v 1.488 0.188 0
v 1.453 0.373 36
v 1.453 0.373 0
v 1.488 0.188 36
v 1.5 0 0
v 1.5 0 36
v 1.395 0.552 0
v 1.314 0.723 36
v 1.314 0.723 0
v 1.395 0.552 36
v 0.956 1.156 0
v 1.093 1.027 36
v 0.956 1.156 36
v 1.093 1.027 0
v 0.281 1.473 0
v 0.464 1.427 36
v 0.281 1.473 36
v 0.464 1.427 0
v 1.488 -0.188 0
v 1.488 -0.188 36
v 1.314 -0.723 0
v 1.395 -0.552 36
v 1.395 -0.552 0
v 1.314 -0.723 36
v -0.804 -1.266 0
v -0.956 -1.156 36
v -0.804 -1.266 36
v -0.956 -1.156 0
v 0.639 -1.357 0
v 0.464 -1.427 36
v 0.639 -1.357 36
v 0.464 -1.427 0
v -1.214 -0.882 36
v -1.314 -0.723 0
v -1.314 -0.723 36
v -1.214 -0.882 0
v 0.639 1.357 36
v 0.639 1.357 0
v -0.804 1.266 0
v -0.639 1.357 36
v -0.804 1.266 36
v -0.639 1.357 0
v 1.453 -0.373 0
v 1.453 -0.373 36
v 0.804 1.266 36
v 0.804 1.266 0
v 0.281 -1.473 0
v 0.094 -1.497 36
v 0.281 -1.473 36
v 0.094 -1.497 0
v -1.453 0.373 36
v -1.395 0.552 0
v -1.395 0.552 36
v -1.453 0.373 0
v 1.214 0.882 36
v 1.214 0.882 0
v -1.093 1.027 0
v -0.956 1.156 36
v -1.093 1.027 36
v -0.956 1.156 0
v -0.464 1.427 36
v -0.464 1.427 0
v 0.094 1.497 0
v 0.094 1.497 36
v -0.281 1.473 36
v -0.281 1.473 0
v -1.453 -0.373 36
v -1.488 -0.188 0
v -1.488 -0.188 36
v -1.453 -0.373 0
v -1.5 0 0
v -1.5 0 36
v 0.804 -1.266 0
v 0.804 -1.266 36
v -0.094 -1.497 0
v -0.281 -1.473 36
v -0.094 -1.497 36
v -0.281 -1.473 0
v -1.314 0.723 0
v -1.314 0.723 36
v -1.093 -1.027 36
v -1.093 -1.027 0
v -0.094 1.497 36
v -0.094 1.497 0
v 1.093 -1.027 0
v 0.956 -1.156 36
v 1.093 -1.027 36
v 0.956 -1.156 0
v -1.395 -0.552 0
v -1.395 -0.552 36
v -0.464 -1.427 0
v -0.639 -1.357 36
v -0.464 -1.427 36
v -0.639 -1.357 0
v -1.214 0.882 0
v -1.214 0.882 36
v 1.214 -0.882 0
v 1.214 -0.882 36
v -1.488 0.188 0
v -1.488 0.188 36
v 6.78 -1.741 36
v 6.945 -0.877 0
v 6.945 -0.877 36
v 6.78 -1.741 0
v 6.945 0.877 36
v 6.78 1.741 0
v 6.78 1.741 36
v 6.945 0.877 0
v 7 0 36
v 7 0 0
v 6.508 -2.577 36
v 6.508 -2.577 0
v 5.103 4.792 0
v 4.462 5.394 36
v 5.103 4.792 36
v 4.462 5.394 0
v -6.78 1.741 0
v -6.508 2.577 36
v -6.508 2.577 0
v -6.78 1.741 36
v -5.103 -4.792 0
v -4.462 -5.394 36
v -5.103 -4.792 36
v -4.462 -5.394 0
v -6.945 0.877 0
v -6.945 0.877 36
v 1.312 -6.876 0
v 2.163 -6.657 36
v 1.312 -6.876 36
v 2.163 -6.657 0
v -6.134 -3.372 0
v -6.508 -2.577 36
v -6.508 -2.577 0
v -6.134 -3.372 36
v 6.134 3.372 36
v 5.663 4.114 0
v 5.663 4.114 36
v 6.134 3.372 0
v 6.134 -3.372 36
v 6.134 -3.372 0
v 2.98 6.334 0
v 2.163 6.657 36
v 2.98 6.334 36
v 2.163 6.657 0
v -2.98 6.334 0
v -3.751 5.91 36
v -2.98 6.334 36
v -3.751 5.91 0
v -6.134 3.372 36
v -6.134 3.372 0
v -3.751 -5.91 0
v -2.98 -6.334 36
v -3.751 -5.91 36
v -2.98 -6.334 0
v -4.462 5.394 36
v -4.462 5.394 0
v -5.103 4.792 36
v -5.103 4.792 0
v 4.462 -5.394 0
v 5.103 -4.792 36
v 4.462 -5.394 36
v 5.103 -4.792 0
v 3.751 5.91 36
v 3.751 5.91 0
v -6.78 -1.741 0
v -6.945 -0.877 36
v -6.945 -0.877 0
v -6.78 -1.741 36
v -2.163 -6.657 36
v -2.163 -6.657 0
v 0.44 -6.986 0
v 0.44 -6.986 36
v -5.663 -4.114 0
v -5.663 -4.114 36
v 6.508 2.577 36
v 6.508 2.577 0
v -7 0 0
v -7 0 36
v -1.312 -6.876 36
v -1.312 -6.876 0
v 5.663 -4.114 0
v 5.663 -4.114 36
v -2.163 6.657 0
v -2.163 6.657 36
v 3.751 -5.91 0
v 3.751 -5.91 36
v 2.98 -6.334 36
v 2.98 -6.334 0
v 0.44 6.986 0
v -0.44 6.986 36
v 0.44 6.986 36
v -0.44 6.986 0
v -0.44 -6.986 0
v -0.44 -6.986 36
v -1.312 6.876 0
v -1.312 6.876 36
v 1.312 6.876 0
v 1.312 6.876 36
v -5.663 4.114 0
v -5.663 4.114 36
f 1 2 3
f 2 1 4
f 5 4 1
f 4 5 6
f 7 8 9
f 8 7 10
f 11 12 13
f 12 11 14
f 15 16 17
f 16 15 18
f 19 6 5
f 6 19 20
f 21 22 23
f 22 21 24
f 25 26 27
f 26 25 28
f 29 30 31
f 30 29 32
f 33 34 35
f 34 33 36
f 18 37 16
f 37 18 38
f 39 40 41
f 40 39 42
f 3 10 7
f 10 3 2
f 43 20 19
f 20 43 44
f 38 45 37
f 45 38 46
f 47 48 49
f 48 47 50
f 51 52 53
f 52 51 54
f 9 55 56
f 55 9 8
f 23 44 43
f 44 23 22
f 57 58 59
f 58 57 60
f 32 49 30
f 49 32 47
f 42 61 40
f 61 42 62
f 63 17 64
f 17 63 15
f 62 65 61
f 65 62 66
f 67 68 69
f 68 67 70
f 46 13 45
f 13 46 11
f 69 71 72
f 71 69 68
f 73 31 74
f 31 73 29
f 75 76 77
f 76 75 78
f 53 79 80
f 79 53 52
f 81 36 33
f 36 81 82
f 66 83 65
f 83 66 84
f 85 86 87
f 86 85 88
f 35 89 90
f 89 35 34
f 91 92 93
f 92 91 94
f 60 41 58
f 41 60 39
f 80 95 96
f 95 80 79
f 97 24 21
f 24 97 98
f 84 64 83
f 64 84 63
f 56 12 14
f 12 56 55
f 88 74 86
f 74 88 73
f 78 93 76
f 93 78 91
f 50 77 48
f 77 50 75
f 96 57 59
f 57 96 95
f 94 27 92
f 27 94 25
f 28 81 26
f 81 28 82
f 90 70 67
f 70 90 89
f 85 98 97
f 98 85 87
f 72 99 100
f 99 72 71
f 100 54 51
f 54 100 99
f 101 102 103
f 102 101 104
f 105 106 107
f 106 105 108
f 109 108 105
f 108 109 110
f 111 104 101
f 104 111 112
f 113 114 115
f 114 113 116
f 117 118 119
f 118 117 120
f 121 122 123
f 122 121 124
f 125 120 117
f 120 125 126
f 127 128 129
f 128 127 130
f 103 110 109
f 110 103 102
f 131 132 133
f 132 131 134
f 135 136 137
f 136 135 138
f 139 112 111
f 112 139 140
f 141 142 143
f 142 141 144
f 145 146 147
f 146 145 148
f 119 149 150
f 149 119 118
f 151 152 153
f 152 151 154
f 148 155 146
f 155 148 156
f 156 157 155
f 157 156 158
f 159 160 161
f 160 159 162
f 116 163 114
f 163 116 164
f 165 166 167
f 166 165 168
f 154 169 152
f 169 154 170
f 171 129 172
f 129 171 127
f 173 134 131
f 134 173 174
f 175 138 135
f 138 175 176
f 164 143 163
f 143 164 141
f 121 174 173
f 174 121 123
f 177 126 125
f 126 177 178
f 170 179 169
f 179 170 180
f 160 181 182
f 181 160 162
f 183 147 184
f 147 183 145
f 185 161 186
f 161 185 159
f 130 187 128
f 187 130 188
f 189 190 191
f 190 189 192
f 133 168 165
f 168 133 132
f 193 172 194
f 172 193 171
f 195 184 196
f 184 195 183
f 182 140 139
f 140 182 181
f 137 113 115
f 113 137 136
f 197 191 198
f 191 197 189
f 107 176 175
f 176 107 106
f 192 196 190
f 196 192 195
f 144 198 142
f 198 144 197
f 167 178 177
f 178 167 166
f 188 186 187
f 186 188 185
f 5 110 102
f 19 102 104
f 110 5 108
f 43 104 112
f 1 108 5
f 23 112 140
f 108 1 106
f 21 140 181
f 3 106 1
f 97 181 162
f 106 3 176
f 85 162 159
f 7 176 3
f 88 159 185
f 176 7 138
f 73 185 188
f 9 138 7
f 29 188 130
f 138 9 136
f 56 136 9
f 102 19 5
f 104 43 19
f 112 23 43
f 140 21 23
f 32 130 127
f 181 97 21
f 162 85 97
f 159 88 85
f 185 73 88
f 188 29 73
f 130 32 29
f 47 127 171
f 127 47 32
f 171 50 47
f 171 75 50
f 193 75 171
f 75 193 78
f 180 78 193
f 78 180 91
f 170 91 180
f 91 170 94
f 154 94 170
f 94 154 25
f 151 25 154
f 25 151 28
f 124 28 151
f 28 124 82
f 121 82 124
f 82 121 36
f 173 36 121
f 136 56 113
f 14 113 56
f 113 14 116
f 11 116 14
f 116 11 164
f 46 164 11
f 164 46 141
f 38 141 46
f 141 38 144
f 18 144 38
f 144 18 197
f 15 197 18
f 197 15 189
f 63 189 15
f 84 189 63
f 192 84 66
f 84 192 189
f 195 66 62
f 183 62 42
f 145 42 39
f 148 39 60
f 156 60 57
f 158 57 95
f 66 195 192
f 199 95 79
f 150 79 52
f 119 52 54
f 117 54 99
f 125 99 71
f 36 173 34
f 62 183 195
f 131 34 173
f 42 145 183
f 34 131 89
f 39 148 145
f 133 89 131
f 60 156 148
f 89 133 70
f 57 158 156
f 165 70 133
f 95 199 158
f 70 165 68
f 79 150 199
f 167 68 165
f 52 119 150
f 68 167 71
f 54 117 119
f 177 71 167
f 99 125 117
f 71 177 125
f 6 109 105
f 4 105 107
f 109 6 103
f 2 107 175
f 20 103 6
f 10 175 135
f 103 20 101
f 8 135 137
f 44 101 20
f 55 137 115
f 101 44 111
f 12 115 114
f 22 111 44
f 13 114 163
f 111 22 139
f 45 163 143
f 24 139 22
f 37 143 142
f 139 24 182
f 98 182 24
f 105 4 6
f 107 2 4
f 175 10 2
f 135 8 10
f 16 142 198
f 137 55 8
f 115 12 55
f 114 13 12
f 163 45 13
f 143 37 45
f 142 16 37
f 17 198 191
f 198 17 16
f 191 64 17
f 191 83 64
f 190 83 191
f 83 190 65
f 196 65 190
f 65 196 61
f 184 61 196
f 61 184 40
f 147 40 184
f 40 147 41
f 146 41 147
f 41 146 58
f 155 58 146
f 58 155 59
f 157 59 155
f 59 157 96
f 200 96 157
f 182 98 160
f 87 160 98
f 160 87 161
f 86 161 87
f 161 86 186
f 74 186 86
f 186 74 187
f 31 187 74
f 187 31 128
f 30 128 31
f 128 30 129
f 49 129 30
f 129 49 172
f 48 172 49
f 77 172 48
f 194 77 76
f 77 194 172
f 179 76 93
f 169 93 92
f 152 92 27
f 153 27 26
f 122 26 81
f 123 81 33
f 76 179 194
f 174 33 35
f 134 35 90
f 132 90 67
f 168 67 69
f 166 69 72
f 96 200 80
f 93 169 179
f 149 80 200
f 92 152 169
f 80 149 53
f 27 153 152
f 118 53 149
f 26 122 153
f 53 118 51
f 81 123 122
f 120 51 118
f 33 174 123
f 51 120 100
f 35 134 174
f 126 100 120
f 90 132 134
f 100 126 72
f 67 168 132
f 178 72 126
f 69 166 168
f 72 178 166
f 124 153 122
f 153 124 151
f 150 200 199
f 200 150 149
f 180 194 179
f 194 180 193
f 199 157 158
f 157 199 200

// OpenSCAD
$fn = 50;


difference() {
	union() {
		cylinder(h = 36, r = 7.0000000000);
	}
	union() {
		translate(v = [0, 0, -100]) {
			cylinder(h = 200, r = 1.5000000000);
		}
		translate(v = [0, 0, -100]) {
			cylinder(h = 200, r = 1.5000000000);
		}
	}
}
